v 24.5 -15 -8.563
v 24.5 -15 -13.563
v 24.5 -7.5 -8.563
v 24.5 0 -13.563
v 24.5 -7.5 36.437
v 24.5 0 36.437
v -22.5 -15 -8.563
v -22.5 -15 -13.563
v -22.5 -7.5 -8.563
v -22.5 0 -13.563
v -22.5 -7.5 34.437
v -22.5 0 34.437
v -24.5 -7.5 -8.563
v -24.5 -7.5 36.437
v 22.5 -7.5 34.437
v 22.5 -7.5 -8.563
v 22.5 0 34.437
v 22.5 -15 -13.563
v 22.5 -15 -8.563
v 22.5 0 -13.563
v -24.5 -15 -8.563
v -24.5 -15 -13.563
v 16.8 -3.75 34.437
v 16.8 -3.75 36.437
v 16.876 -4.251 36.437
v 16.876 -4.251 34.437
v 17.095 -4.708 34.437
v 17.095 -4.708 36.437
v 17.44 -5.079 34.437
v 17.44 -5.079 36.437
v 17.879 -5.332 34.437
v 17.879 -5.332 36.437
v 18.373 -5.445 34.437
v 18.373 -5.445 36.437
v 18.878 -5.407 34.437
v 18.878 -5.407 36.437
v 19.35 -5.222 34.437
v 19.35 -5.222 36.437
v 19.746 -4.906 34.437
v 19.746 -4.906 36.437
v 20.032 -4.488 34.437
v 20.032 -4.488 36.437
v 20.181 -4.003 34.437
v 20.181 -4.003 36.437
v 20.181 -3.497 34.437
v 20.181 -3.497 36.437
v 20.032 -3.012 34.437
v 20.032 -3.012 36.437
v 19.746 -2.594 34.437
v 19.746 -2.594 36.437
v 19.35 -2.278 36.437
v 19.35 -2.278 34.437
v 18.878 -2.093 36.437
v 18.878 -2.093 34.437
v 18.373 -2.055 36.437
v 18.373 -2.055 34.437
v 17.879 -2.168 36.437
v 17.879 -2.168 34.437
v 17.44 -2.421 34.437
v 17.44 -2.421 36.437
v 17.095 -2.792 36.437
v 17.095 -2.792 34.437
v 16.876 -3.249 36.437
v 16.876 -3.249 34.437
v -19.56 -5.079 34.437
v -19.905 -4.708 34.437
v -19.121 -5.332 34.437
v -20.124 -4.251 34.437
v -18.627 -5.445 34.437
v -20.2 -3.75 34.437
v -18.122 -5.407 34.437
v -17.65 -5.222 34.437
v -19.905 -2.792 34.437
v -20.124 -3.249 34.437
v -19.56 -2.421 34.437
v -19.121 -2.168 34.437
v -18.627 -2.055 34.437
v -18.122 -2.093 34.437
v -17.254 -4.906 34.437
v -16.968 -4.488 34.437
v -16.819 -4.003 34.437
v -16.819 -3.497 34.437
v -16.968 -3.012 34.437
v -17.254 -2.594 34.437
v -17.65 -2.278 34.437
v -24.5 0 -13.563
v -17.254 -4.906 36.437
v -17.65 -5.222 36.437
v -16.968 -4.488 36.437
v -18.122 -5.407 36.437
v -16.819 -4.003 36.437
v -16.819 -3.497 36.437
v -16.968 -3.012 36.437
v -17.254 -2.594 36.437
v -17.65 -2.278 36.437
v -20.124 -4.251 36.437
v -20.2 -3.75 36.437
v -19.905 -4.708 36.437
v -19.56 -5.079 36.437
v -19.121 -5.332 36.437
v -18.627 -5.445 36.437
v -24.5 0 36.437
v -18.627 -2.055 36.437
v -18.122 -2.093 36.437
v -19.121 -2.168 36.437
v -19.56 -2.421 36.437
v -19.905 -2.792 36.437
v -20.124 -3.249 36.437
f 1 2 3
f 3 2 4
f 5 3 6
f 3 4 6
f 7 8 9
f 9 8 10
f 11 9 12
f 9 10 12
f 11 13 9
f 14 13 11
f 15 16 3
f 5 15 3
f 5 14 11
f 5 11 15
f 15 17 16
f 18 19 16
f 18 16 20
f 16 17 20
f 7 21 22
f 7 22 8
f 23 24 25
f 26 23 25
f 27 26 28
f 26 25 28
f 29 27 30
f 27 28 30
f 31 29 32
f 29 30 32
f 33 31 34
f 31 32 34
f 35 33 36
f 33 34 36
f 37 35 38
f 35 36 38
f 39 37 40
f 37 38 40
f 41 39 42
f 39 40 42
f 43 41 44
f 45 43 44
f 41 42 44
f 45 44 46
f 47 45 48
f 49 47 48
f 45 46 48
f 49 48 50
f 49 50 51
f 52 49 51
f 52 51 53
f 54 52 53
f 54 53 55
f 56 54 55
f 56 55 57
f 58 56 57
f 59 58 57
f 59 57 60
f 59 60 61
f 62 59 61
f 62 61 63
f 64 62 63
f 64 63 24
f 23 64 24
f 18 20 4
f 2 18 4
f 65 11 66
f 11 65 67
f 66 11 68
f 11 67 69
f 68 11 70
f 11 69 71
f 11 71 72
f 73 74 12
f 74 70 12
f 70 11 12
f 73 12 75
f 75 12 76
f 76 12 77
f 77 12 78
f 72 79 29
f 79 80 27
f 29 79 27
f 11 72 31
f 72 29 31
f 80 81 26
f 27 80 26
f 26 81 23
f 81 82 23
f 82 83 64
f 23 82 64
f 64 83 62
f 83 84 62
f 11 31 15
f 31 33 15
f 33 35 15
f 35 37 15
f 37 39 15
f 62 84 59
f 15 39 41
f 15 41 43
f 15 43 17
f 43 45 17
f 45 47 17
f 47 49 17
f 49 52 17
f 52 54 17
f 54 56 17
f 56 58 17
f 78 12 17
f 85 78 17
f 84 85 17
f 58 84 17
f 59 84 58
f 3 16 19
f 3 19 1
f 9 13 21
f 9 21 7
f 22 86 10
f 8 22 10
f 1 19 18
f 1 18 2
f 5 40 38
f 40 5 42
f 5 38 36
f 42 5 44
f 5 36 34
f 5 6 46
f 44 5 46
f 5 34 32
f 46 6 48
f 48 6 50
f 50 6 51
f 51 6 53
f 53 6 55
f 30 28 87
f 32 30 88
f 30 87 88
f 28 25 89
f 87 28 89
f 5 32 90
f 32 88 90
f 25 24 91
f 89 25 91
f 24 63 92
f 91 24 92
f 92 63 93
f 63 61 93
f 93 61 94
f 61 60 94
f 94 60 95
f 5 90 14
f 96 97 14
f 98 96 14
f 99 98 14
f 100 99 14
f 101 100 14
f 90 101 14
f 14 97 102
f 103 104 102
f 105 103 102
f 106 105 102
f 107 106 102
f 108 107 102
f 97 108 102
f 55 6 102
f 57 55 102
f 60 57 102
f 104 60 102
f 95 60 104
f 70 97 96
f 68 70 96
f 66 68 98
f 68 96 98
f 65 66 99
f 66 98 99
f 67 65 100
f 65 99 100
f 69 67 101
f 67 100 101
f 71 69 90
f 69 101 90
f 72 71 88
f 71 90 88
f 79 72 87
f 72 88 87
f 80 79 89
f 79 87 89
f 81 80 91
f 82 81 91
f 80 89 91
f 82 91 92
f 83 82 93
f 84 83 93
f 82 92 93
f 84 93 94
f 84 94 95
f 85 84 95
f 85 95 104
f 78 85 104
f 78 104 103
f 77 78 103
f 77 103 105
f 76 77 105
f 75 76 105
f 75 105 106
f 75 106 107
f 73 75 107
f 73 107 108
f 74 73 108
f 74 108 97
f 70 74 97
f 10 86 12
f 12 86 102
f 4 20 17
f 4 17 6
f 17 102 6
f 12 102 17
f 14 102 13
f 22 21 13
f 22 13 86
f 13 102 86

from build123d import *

# Parameters (mm, degrees)
F0_W     = 2
F0_H     = 5
F1_DEPTH = 7.5
F3_D     = 3.4
F4_D     = 3.4
F5_DEPTH = 15


with BuildPart() as f1:
    # F0 (on Front) → F1 (new body)
    with BuildSketch(Plane.XZ):
        Polygon((-22.5, -8.5627355796), (-22.5, 34.4372644204), (22.5, 34.4372644204), (22.5, -8.5627355796), (24.5, -8.5627355796), (24.5, 36.4372644204), (-24.5, 36.4372644204), (-24.5, -8.5627355796), align=None)
        with Locations((-23.5, -11.0627355796)):
            Rectangle(F0_W, F0_H)
        with Locations((23.5, -11.0627355796)):
            Rectangle(F0_W, F0_H)
    extrude(amount=F1_DEPTH)

    # F3 (through all)
    with Locations(Plane(origin=(0, 0, 34.4372644204), x_dir=(1, 0, 0), z_dir=(0, 0, -1))):
        with Locations((-18.5, 3.75)):
            Hole(F3_D / 2)

    # F4 (through all)
    with Locations(Plane(origin=(0, 0, 34.4372644204), x_dir=(1, 0, 0), z_dir=(0, 0, -1))):
        with Locations((18.5, 3.75)):
            Hole(F4_D / 2)

    # F0 (on Front) → F5 (join)
    with BuildSketch(Plane.XZ):
        with Locations((-23.5, -11.0627355796)):
            Rectangle(F0_W, F0_H)
        with Locations((23.5, -11.0627355796)):
            Rectangle(F0_W, F0_H)
    extrude(amount=F5_DEPTH)


solid = f1.part
